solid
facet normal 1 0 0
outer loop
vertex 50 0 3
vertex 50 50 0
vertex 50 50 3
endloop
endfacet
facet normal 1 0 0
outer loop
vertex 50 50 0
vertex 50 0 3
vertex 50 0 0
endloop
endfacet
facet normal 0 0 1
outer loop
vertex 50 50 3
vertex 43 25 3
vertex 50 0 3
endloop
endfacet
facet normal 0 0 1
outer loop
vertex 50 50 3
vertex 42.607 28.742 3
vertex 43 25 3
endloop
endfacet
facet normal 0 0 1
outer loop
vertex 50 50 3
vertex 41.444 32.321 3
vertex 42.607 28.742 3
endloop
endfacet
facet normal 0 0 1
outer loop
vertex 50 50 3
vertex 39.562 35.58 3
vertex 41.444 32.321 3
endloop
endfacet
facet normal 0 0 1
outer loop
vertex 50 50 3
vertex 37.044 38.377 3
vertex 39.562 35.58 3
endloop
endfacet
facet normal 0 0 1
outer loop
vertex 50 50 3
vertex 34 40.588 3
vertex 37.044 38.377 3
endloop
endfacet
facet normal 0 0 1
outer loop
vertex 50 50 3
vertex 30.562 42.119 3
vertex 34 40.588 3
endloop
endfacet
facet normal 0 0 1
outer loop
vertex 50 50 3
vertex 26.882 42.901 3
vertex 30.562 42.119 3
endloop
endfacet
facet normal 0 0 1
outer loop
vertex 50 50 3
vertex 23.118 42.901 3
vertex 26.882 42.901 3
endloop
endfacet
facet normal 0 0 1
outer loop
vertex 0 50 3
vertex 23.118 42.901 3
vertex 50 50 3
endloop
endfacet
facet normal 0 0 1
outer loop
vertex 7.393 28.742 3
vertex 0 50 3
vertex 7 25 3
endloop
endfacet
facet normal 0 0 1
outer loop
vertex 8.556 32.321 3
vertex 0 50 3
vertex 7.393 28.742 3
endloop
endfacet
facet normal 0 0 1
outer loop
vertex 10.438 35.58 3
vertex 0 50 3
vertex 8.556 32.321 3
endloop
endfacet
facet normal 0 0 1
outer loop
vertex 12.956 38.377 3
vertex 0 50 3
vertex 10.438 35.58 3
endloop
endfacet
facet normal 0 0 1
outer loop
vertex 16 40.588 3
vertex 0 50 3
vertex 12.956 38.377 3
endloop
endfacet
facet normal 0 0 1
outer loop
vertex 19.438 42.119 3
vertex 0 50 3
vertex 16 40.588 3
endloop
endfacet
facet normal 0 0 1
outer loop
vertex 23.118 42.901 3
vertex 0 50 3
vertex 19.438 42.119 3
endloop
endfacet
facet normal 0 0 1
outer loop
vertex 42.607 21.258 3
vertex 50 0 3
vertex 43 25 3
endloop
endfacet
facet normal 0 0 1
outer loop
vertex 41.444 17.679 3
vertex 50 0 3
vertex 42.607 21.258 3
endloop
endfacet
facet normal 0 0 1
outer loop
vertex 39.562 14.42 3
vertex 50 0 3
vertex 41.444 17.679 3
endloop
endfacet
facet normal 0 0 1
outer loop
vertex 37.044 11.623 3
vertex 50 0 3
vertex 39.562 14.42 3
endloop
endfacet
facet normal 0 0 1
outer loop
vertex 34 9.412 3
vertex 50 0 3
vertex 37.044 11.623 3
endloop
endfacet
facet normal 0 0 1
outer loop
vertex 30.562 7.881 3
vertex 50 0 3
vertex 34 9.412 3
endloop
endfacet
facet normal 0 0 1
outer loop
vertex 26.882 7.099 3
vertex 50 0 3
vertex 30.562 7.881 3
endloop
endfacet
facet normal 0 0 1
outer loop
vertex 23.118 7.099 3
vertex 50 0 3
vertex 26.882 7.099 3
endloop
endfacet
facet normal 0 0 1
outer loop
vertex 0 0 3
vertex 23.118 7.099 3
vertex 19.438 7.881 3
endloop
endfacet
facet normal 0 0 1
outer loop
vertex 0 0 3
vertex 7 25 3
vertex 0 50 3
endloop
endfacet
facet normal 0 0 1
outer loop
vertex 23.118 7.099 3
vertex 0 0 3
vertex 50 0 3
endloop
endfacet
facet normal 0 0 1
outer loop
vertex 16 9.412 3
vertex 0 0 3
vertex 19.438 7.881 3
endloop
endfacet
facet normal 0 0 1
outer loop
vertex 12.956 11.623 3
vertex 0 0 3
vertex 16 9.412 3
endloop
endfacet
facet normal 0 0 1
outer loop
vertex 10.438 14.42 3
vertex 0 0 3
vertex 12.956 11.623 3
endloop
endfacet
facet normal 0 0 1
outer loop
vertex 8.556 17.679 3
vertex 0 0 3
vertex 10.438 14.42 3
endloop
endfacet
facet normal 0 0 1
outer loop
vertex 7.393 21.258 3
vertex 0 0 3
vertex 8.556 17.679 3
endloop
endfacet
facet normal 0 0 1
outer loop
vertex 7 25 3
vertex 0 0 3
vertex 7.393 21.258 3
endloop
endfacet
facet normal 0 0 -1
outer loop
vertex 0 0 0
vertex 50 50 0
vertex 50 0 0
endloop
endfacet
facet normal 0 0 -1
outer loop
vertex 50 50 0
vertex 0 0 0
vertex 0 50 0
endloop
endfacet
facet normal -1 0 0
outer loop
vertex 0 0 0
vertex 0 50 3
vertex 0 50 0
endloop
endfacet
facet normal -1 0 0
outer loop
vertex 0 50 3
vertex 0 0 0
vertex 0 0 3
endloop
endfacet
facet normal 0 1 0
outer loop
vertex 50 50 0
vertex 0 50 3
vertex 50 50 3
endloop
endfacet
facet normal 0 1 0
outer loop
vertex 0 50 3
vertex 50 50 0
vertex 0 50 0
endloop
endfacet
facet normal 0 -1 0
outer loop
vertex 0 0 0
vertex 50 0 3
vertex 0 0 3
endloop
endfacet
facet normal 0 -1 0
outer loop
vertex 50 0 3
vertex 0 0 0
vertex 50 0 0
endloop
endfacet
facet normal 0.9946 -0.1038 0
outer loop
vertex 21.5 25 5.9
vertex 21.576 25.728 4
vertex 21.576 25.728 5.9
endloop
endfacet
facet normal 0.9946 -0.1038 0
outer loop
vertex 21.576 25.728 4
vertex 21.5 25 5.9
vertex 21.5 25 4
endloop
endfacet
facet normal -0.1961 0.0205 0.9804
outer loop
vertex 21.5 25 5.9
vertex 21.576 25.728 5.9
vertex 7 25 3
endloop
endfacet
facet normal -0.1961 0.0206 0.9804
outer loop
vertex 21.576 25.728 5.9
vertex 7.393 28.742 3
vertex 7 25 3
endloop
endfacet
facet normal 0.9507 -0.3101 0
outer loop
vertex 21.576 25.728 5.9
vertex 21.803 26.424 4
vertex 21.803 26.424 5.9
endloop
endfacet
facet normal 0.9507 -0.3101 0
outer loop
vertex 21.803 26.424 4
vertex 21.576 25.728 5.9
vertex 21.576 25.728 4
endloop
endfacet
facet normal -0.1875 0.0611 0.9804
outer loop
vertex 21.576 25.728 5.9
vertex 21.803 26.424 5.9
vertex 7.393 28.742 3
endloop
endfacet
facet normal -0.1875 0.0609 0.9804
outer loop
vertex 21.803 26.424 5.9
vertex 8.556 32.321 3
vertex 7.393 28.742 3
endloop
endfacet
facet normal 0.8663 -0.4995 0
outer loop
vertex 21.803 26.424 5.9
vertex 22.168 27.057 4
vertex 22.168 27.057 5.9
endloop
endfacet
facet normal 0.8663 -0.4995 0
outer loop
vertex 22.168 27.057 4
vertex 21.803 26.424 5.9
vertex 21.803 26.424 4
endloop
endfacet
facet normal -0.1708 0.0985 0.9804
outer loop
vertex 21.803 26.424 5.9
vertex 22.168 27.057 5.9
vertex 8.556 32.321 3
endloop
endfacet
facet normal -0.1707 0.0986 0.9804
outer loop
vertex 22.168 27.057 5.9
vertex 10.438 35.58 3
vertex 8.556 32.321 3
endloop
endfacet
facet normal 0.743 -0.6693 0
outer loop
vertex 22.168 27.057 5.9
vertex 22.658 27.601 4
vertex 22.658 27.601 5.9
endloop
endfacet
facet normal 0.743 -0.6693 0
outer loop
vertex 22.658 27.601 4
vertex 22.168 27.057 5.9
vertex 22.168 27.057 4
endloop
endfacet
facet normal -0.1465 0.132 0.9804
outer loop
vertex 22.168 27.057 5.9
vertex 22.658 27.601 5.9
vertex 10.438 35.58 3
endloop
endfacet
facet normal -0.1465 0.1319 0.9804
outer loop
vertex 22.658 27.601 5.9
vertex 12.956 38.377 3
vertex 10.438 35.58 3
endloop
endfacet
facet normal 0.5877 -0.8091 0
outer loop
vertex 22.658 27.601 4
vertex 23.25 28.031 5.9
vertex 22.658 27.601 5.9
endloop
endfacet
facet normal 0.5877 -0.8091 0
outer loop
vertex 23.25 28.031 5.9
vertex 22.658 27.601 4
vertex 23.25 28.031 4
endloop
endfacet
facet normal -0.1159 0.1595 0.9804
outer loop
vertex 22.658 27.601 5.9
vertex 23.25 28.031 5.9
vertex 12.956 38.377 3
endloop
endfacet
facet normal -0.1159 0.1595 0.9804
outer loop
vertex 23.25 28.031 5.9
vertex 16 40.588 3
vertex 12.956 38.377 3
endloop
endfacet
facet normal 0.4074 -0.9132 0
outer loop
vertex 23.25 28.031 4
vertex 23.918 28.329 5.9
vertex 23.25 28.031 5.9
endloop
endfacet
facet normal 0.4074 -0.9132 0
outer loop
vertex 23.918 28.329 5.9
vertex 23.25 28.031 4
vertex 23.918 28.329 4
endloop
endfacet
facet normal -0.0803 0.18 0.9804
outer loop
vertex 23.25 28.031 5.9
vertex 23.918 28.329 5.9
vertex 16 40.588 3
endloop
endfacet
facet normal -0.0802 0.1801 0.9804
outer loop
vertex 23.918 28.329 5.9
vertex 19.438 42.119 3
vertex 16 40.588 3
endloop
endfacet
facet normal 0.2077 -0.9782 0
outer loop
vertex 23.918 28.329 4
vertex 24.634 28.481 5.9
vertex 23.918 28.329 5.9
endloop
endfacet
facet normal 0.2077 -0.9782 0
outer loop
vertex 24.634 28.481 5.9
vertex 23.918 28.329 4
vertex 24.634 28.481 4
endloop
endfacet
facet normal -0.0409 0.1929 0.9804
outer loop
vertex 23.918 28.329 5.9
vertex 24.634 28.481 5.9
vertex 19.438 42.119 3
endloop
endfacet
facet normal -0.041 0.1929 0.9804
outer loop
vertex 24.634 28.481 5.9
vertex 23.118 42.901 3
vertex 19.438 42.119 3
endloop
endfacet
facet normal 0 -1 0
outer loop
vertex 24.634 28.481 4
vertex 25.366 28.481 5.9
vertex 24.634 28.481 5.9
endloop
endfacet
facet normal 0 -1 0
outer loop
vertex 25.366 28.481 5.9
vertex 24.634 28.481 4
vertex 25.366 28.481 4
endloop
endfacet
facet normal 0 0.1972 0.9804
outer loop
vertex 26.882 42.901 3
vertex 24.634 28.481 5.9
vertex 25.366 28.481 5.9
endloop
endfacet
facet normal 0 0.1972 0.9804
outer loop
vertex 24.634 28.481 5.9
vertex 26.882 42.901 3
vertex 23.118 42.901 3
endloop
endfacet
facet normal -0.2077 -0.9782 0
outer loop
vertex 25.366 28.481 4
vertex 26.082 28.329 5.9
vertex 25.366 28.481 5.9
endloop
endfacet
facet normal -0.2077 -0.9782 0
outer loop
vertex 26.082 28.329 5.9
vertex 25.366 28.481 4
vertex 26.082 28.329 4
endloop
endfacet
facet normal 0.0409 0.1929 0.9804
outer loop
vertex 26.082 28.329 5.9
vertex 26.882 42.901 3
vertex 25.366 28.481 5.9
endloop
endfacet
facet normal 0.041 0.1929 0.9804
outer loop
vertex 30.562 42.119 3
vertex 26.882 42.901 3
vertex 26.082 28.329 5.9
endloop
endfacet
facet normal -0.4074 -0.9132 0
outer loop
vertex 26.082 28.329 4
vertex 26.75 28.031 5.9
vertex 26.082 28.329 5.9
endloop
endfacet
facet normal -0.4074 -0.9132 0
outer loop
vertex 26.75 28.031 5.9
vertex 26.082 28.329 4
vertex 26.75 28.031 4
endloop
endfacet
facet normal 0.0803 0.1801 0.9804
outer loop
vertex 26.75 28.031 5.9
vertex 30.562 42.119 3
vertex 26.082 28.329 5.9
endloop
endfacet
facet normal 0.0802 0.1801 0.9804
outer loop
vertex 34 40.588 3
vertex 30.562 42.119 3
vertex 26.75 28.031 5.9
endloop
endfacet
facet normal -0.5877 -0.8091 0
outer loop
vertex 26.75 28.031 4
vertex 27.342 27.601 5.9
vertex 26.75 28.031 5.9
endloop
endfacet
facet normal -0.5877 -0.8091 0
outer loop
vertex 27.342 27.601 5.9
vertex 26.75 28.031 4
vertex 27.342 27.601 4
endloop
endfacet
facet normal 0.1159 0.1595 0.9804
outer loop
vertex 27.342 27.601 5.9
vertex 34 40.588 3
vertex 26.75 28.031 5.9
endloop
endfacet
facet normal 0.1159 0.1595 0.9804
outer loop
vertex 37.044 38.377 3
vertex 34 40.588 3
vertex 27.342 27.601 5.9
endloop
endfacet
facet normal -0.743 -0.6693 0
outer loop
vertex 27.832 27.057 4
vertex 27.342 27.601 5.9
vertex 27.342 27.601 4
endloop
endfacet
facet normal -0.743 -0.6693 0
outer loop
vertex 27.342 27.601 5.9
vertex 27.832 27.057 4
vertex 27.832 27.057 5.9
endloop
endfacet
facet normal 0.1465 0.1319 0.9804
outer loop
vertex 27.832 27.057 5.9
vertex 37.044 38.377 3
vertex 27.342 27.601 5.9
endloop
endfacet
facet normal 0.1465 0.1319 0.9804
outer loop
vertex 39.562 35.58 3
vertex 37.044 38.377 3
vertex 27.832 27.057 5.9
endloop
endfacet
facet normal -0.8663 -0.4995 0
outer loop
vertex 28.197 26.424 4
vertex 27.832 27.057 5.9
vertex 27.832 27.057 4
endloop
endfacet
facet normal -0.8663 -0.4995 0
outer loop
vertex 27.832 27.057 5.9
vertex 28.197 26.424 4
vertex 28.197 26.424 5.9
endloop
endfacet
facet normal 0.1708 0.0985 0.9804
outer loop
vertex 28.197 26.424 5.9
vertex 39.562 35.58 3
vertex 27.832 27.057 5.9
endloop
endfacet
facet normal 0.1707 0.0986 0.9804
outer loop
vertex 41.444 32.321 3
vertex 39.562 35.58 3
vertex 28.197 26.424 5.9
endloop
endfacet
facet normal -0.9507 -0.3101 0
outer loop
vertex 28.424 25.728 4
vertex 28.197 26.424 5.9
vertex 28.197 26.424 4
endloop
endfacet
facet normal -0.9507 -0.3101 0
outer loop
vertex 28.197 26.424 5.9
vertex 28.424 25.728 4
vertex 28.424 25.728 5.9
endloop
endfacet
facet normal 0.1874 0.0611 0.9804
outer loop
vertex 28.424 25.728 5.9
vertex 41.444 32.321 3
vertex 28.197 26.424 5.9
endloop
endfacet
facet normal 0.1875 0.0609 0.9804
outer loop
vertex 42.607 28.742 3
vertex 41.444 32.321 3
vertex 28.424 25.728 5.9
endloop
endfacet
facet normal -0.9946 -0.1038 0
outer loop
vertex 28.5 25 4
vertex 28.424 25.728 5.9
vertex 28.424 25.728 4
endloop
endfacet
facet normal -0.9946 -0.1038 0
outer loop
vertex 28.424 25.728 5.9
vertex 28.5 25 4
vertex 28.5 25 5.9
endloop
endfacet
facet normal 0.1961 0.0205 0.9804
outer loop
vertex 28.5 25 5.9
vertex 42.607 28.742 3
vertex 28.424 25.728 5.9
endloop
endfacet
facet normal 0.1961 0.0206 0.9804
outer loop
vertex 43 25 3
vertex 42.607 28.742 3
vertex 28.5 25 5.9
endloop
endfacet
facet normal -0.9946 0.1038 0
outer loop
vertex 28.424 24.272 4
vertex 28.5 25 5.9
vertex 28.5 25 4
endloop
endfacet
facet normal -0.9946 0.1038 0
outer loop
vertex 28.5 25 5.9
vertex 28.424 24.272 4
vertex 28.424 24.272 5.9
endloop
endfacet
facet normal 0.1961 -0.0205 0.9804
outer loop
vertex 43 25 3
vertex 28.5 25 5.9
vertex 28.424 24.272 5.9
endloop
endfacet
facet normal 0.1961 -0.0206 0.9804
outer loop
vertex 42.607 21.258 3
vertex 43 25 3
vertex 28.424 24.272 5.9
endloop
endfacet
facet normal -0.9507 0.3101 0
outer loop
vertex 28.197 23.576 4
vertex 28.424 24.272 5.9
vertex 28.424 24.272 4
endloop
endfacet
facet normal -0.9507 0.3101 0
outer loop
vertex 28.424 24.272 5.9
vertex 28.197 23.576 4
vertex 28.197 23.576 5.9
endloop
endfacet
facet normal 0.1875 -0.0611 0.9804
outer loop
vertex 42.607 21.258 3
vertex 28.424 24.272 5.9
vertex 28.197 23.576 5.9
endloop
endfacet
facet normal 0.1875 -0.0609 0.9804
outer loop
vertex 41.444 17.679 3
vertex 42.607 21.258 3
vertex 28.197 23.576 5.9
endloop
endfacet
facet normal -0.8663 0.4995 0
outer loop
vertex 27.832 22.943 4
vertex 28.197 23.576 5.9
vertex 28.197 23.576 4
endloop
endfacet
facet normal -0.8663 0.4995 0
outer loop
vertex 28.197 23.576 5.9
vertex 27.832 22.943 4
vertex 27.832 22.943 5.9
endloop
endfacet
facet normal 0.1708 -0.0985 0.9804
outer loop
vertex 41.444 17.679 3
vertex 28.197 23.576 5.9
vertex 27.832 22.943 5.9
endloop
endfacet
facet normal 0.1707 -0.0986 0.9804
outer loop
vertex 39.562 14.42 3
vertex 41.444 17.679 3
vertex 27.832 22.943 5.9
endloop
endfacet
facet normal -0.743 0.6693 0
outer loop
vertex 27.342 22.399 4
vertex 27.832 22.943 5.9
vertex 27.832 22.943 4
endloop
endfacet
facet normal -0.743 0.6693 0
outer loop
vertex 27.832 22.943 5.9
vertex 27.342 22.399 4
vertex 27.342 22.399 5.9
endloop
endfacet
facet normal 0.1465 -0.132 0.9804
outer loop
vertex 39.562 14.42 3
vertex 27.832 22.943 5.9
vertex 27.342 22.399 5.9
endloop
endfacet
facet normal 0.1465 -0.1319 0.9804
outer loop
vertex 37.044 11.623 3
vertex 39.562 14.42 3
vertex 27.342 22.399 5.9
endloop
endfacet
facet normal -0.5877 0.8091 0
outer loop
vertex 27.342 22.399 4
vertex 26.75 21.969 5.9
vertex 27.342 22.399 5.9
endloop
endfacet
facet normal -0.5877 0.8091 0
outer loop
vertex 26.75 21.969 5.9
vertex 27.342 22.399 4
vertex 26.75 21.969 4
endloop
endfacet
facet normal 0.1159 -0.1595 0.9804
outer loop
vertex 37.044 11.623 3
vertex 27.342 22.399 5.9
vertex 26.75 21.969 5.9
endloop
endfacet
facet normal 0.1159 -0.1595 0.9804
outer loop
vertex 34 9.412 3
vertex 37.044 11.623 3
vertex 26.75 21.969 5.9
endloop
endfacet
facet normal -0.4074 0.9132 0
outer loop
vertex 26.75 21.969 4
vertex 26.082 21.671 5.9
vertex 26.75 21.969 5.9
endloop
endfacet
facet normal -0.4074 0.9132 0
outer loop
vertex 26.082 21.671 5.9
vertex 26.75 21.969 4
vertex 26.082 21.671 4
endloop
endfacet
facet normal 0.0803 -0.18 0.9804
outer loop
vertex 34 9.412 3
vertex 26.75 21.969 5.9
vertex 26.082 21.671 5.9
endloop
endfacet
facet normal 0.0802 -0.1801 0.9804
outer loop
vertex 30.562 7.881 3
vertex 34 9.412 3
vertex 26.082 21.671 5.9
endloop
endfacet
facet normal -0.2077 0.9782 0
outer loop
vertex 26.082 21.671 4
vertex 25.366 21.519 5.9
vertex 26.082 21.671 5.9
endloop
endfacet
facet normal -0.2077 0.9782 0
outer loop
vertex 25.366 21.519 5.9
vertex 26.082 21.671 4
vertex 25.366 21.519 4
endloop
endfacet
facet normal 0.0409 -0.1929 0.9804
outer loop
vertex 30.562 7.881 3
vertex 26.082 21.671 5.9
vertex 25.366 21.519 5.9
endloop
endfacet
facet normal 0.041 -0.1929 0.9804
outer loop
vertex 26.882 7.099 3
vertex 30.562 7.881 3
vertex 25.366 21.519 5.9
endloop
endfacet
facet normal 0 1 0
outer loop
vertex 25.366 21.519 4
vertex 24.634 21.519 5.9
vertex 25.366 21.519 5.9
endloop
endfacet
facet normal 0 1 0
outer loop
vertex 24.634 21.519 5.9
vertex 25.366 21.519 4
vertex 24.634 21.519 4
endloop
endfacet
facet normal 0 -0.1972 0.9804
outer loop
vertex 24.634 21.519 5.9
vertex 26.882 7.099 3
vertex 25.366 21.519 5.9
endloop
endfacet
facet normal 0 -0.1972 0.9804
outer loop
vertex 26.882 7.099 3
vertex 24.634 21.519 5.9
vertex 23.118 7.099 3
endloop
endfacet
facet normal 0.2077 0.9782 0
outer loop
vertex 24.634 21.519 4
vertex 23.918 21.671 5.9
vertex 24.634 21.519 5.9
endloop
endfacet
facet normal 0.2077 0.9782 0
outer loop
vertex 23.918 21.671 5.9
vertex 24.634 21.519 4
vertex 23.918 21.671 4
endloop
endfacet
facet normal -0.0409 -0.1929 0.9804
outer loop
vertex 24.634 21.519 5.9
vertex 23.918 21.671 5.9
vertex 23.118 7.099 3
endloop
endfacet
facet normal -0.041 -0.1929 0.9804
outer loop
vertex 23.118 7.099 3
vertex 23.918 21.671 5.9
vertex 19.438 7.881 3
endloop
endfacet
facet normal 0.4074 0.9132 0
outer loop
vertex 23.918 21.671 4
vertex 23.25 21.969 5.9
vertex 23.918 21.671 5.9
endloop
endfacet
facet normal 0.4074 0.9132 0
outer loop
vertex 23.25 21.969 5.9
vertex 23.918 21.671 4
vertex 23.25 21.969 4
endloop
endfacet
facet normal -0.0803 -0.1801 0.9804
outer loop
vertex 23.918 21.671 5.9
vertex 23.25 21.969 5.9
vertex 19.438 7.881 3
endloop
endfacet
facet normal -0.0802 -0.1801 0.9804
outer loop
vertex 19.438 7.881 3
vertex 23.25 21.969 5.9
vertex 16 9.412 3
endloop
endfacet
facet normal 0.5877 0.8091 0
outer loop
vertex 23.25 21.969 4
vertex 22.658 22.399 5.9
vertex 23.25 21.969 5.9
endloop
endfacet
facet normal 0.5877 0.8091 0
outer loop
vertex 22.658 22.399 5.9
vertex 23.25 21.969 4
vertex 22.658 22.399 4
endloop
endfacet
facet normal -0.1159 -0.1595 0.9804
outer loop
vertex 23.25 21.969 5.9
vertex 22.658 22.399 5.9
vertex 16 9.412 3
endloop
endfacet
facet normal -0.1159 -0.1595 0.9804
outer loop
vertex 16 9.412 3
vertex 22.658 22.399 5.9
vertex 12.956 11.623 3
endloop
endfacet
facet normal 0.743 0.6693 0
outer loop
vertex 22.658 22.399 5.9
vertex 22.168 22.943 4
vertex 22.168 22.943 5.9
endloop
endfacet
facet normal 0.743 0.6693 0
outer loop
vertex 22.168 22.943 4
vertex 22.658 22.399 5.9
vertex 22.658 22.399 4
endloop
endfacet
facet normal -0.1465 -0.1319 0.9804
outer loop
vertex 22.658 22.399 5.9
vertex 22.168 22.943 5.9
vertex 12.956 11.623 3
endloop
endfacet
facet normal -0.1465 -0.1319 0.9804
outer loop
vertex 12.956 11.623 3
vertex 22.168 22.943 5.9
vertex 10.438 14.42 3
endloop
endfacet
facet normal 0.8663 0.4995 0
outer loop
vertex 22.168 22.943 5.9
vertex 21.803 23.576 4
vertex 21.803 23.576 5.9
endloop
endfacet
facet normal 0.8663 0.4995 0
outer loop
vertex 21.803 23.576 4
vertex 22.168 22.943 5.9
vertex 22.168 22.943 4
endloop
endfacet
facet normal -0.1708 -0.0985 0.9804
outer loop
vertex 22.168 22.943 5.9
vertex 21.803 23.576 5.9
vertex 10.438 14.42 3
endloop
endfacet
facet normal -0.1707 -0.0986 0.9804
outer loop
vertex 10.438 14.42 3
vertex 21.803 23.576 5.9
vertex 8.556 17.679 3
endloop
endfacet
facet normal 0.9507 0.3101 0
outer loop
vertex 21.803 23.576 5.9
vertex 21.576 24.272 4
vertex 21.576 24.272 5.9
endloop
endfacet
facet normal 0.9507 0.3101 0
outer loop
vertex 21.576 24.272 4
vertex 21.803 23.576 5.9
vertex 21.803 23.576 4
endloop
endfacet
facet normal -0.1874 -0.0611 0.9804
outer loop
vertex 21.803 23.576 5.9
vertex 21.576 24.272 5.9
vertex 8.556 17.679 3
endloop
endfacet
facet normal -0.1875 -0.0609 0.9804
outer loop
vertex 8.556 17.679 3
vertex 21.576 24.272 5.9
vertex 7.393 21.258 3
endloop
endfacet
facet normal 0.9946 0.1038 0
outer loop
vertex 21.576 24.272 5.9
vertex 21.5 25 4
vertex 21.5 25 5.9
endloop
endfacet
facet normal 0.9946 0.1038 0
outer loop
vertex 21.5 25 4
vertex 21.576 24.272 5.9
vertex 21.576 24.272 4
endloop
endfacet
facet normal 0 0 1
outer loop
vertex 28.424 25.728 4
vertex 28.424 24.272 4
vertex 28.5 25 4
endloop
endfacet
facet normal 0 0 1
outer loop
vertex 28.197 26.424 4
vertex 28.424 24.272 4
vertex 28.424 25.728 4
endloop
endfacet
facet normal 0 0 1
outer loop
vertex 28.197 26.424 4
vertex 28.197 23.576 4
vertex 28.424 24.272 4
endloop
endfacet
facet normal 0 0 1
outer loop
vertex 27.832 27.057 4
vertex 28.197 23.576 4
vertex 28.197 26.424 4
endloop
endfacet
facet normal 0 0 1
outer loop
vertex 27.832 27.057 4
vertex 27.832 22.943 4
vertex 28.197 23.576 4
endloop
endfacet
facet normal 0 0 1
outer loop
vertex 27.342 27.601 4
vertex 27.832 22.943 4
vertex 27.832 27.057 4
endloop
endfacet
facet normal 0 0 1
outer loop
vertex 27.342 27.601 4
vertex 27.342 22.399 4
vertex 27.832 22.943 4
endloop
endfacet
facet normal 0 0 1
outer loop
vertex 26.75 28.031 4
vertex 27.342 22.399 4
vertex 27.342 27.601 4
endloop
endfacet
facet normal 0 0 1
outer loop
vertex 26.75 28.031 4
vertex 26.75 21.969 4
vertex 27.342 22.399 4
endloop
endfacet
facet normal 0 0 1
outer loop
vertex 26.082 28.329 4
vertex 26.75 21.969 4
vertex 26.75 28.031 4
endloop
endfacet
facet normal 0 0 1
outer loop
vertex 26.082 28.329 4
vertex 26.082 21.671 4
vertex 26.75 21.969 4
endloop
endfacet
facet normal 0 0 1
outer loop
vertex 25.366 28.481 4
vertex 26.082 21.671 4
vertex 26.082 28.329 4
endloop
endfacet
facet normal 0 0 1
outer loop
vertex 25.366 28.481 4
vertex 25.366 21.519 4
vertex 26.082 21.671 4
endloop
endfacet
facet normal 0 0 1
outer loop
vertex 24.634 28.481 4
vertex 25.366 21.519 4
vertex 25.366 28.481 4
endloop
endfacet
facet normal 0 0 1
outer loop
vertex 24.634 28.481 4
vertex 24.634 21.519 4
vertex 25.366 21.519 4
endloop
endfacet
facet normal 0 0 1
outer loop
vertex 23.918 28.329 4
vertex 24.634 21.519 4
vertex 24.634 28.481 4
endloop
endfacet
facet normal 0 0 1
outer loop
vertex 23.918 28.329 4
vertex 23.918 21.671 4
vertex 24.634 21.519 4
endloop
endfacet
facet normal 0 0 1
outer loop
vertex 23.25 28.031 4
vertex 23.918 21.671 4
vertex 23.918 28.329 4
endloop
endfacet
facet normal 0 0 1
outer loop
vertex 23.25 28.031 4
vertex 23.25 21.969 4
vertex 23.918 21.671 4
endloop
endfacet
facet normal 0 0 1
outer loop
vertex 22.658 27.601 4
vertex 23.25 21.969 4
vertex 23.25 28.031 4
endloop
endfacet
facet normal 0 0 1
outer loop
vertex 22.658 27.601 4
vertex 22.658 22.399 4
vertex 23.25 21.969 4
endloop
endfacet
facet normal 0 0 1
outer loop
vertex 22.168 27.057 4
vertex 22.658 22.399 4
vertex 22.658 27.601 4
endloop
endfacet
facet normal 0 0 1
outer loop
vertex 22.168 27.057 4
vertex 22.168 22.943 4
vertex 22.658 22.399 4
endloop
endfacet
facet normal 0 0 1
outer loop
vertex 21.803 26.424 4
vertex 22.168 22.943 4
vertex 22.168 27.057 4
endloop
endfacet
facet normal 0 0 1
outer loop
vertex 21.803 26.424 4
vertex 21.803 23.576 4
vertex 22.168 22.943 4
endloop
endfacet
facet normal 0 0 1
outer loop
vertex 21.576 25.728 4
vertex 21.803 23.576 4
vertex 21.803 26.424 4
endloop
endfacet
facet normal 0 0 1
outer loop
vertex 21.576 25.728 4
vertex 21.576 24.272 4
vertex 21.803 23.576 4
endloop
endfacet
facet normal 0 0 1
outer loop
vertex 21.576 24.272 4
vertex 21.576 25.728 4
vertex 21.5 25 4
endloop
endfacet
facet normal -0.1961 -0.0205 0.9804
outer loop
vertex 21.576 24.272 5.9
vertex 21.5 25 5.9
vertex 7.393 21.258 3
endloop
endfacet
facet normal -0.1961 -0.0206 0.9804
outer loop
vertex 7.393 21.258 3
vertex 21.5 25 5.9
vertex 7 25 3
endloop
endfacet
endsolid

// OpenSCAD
// file: enclosure_lib.scad
module SimpleCorner(wallWidth = 3,
                    totalWidth = 50,
                    totalHeight = 50,
                    totalDepth = 50,
                    gutterWidth = 3)
{
    // back wall
    cube([totalWidth,wallWidth,totalHeight]);
    // side wall
    translate([totalWidth,0,0])
        rotate([0,0,90])
            cube([totalDepth,wallWidth,totalHeight]);
    // base
    translate([0,totalDepth,0])
        rotate([90, 0, 0])
            cube([totalWidth,
                  wallWidth,
                  totalDepth]);
    // back gutter
    translate([0,
               wallWidth + gutterWidth,
               wallWidth * 2])
        rotate([0,90,0])
            cube([wallWidth, 
                  wallWidth, 
                  totalWidth - wallWidth - gutterWidth]);
    // side gutter
    translate([totalWidth - 2 * wallWidth - gutterWidth,
               totalDepth,
               wallWidth])
        rotate([90,0,0])
            cube([wallWidth, 
                  wallWidth, 
                  totalDepth - wallWidth - gutterWidth]);
    // gutter fill
    cube(3);
}
module Cone(holeRadius = 3)
{
    centerRadius    = 3;
    centerHeight    = 2;
    masterRadius    = 18;
    totalHeight     = 3;
    tanAlpha        = totalHeight / (masterRadius - centerRadius);
    holeHeight      = tanAlpha * (masterRadius - holeRadius);
    rotate_extrude()
        polygon(points=[
            [0, 0],
            [masterRadius, 0],
            [holeRadius, holeHeight],
            [holeRadius, 1],
            [0, 1]
        ]);
}
module Base(width = 50,
       depth = 50,
       halfHeight = 3)
{
    cube([width, depth, halfHeight]);
    translate([width / 2, depth / 2, halfHeight])
        Cone(3.5);
}

module BasedCorner(wallWidth = 3,
                   width = 50,
                   height = 50,
                   depth = 50,
                   gutterWidth = 3.4)
{
    translate([0, 0, wallWidth])
        union() {
            SimpleCorner(wallWidth, 
                         width, 
                         height - wallWidth, 
                         depth,
                         gutterWidth);
            translate([0,0, -wallWidth])
                difference() {
                    cube([width, depth, wallWidth]);
                    translate([width/2, depth/2, -.01])
                        Cone();
            }
        }
}

module top_profile(gutterWidth = 3) 
{
    polygon([
        [0, 0],
        [0, 9],
        [6, 9],
        [6, 6],
        [21,6],
        [21,3],
        [6 + gutterWidth, 3],
        [6 + gutterWidth, 0],
        [3 + gutterWidth, 0],
        [3 + gutterWidth, 3],
        [3, 3],
        [3, 0],
    ]);
}

import("/home/eugenio/repos/3dmodels/enclosure/leg_based_enclosure__.stl");
import("/home/eugenio/repos/3dmodels/enclosure/leg_based_enclosure__.stl");
// main file
use <enclosure_lib.scad>

wall_h = 3;
d=50;
w=50;


Base(w, d, wall_h);
